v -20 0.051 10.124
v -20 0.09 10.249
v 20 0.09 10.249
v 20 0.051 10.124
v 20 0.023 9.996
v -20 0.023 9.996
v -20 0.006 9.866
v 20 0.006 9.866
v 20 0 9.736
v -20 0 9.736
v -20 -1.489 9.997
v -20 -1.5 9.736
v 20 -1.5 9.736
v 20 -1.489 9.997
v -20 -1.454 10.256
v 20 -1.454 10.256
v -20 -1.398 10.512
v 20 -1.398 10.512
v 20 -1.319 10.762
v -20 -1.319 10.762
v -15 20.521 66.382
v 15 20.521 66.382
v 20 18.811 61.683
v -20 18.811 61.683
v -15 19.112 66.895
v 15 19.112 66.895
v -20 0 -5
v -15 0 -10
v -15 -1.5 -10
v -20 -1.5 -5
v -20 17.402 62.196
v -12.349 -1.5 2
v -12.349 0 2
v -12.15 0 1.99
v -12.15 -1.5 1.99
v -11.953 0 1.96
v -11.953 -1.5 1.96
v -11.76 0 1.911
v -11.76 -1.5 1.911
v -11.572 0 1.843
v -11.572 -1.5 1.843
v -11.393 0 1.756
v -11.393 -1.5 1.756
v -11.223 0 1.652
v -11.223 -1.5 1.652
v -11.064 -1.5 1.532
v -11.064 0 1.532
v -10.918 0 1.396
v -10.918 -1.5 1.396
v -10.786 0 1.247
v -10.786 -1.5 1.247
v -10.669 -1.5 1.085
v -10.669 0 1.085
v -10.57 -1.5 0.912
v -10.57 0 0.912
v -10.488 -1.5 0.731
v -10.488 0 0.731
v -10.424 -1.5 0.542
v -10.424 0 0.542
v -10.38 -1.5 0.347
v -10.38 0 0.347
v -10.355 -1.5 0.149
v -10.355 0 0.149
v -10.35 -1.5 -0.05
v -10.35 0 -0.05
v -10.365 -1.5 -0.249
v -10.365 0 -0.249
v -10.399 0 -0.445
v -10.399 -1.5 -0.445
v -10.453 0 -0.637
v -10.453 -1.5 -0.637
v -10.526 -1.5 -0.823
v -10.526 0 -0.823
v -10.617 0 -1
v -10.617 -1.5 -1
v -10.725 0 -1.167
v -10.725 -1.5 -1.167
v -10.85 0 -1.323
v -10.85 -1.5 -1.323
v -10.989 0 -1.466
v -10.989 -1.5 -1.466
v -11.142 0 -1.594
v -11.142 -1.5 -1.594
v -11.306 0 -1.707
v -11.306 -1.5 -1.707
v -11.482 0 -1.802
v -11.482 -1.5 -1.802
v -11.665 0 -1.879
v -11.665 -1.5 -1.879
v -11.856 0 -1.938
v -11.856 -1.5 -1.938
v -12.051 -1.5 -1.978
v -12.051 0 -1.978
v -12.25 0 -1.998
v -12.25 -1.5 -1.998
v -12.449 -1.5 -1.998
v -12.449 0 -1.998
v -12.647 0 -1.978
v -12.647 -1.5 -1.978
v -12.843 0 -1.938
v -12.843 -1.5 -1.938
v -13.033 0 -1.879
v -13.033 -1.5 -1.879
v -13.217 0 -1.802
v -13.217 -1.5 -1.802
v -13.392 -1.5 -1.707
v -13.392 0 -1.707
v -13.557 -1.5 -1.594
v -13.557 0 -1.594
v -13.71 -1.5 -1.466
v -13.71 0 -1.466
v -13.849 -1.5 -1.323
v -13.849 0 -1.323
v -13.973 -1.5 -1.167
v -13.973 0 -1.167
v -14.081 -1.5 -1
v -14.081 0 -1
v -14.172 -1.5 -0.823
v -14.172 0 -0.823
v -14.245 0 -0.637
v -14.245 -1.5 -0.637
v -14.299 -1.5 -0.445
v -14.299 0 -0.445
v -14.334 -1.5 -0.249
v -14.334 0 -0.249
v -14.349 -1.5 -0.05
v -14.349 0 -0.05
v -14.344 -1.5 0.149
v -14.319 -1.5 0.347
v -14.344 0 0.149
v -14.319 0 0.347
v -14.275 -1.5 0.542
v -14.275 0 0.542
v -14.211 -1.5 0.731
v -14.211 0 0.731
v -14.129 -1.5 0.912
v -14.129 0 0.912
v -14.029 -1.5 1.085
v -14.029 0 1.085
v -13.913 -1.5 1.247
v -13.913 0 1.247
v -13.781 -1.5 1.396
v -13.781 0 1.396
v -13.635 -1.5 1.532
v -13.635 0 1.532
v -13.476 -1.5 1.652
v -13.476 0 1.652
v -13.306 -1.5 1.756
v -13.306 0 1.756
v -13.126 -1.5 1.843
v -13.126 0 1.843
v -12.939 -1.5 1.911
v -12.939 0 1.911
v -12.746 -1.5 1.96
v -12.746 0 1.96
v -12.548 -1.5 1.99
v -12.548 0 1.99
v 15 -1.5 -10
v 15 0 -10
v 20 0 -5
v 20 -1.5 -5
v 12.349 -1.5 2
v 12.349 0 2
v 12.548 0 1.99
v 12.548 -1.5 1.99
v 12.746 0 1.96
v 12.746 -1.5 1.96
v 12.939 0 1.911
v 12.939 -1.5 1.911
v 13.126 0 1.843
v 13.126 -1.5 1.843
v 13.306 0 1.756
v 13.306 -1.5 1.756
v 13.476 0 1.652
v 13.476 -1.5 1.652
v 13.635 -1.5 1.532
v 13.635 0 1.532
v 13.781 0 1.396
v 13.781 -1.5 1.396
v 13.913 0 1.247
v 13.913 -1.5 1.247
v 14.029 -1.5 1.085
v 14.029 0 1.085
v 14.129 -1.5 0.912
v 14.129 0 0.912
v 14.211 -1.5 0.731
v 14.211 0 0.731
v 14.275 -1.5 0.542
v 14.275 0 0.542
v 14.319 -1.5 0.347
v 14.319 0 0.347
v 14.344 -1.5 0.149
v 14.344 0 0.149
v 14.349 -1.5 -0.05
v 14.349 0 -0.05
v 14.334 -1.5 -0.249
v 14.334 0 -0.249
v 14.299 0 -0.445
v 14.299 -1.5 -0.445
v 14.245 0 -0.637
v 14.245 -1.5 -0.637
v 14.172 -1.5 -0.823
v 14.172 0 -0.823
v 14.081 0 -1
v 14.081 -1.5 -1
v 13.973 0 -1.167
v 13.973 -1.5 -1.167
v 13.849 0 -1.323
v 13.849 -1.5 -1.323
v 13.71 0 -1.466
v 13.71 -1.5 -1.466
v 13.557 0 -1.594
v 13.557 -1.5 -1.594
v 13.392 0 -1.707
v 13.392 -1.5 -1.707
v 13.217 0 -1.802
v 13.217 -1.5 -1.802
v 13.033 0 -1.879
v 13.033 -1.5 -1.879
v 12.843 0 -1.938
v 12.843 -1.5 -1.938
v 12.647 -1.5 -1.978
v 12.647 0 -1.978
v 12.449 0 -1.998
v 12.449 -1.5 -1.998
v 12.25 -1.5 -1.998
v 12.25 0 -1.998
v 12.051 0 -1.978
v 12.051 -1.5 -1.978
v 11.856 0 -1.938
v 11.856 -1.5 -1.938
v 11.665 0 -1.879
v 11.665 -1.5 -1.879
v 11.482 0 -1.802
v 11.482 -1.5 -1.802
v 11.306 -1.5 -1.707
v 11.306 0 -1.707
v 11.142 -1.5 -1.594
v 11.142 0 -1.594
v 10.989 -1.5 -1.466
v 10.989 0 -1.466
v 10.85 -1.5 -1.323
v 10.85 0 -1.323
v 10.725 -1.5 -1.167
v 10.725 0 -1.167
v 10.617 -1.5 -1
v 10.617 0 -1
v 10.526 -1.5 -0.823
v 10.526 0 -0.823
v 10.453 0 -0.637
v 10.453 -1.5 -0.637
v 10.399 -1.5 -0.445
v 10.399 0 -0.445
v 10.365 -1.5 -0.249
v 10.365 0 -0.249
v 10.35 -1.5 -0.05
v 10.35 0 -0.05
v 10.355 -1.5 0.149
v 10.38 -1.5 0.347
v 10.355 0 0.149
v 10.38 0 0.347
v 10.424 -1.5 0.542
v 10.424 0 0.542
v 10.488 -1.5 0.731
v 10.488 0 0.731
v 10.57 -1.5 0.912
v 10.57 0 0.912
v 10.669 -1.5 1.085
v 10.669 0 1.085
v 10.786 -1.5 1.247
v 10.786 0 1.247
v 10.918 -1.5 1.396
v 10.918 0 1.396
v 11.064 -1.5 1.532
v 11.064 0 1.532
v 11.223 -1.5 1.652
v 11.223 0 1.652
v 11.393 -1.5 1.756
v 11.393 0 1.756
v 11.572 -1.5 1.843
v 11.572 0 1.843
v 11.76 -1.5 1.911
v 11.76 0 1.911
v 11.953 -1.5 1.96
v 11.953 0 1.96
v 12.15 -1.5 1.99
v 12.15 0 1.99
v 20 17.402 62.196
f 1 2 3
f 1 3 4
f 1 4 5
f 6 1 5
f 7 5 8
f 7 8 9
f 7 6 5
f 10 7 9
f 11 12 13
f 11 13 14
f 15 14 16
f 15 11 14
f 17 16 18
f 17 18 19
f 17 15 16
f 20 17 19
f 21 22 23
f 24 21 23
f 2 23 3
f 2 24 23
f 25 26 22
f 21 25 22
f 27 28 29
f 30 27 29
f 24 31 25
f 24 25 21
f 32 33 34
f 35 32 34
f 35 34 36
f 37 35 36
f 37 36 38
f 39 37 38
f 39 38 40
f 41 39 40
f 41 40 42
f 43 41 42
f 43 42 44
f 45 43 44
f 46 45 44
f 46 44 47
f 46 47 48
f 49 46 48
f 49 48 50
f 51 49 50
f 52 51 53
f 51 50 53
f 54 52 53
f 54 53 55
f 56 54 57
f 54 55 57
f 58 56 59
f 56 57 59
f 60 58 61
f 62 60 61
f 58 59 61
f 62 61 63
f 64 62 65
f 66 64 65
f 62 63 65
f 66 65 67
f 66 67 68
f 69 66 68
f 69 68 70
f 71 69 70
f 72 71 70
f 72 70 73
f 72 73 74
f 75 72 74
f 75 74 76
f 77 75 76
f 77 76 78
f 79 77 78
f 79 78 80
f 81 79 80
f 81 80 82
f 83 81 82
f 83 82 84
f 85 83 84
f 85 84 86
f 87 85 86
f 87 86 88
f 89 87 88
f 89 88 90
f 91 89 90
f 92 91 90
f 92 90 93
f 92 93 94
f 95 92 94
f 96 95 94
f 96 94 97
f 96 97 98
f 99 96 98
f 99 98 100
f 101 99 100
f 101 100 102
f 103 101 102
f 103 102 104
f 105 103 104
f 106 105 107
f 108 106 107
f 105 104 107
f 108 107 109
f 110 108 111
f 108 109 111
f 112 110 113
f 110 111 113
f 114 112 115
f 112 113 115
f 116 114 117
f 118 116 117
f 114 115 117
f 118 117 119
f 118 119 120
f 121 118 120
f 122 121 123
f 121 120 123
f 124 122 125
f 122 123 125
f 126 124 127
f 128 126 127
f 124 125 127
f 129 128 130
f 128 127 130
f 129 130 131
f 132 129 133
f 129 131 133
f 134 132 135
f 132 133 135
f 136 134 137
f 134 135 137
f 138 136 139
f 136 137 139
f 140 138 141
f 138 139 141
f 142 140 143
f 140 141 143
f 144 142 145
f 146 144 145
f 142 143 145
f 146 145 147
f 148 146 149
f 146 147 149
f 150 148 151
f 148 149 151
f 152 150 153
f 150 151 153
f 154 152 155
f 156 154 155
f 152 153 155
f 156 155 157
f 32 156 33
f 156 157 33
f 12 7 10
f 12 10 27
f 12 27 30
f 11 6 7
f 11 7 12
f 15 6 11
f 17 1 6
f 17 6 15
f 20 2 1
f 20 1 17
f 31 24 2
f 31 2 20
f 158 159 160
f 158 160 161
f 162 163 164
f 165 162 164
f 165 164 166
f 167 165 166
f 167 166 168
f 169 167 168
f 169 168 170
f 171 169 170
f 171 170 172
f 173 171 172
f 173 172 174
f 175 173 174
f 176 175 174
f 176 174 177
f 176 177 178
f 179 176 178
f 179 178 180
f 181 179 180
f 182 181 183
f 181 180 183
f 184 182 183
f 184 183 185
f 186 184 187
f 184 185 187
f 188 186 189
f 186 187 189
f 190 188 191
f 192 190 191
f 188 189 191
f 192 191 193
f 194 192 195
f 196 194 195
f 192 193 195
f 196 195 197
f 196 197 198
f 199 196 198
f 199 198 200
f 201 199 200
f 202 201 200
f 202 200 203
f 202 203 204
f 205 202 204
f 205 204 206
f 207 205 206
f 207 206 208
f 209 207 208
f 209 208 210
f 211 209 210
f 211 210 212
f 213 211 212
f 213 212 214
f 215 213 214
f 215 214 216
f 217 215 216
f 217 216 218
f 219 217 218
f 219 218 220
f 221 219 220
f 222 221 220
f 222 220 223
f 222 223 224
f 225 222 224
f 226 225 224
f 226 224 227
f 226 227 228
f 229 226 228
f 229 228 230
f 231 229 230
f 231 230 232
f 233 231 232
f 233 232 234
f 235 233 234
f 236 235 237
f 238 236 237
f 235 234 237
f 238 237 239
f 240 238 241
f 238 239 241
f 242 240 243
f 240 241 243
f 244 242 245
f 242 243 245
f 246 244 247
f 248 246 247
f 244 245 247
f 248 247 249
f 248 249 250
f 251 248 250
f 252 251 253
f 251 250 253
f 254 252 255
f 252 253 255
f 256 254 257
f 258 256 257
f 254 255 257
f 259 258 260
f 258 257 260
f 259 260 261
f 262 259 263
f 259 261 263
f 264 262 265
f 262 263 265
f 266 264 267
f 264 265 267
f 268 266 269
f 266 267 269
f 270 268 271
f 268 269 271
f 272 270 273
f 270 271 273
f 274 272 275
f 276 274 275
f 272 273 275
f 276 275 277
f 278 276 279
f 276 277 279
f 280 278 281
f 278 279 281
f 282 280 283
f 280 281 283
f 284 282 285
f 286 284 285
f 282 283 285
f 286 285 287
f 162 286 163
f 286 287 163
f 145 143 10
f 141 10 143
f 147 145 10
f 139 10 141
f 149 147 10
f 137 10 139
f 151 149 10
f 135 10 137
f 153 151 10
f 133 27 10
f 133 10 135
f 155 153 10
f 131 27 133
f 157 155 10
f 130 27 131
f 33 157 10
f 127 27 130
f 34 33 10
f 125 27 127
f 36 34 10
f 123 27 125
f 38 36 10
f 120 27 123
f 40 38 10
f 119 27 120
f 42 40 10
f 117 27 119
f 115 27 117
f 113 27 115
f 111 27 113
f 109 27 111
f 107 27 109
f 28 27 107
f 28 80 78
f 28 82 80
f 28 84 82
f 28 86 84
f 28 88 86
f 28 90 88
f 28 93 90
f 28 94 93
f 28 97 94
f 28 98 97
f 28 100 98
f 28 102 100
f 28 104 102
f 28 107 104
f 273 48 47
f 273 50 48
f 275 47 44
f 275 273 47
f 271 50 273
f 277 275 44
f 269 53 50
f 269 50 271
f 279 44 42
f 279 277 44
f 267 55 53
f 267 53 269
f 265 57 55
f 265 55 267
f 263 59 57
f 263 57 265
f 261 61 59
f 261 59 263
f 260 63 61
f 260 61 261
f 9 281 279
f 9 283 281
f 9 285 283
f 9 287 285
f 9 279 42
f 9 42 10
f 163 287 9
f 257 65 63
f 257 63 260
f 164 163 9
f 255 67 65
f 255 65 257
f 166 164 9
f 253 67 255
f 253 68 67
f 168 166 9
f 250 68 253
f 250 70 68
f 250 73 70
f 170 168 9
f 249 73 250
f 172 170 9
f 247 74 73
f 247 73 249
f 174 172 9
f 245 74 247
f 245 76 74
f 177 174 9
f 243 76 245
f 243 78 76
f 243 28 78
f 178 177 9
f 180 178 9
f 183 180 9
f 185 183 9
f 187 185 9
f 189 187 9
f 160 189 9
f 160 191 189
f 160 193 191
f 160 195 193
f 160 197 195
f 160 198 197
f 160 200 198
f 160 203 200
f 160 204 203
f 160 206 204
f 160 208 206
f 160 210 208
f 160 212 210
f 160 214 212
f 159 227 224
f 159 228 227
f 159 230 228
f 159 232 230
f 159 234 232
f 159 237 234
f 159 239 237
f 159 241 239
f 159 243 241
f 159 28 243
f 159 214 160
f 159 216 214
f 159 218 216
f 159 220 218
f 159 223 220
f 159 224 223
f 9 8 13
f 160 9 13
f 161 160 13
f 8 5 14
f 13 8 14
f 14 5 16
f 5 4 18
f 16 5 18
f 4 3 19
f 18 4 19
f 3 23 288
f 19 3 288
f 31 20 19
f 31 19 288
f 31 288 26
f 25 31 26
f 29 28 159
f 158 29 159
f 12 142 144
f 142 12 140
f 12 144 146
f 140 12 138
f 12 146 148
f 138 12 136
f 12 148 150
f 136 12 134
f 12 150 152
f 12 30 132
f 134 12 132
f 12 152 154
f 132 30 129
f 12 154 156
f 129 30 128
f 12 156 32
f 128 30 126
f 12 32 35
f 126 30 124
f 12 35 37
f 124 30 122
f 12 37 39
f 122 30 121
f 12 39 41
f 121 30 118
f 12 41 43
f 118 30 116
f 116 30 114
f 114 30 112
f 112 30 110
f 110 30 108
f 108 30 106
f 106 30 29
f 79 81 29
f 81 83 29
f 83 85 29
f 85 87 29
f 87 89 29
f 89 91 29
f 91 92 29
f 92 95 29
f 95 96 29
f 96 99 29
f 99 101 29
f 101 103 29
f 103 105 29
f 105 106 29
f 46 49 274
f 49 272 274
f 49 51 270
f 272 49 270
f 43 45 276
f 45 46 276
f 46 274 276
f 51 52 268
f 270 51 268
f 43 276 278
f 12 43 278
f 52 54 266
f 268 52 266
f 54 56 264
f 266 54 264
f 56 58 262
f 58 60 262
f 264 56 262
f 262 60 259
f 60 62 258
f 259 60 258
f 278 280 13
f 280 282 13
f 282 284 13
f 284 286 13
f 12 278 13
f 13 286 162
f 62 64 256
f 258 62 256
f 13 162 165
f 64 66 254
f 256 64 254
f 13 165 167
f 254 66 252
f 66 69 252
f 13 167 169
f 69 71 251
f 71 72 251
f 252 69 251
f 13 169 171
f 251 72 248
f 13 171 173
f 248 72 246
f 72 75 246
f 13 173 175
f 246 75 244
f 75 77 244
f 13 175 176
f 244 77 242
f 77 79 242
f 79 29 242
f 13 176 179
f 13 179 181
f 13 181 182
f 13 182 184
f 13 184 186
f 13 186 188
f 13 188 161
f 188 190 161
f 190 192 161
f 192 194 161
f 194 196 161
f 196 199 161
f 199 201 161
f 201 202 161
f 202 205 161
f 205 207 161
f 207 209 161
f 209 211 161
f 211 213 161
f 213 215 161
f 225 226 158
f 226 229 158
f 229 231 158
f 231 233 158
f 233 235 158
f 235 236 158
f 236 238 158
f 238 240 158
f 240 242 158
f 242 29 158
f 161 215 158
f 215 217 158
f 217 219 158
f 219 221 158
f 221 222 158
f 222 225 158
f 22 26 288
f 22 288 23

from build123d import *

# Parameters (mm, degrees)
SKETCH1_W                    = 40
SKETCH1_H                    = 20
BASE_FLANGE1_DEPTH           = 1.5
SKETCH4_R                    = 2
CUT_EXTRUDE1_DEPTH           = 10
EDGE_FLANGE1_STRIP_CUT_DEPTH = 40
EDGE_FLANGE1_DEPTH           = 40
CHAMFER1_SIZE                = 5


# Sheet-metal steps are written as plain solids
with BuildPart() as part:
    # Sketch1 → Base-Flange1 (new body)
    with BuildSketch(Plane(origin=(0, 0, 0), x_dir=(1, 0, 0), z_dir=(0, 1, 0))):
        Rectangle(SKETCH1_W, SKETCH1_H)
    extrude(amount=-BASE_FLANGE1_DEPTH)

    # Sketch4 → Cut-Extrude1 (cut)
    with BuildSketch(Plane(origin=(0, 0, 0), x_dir=(1, 0, 0), z_dir=(0, 1, 0))):
        with Locations(Location((-12.349279575, 0, 0), (0, 0, 270))):
            Circle(SKETCH4_R)
        with Locations(Location((12.349279575, 0, 0), (0, 0, 270))):
            Circle(SKETCH4_R)
    extrude(amount=-CUT_EXTRUDE1_DEPTH, mode=Mode.SUBTRACT)

    # Edge-Flange1 strip (across the edge) → Edge-Flange1 strip cut (cut)
    with BuildSketch(Plane(origin=(-20, 0, 10), x_dir=(0, 0.9396926207859105, -0.3420201433256631), z_dir=(1, 0, 0))):
        Polygon((-4.397259152, 7.695663628), (-1.319077862, -0.761569959), (0.090461069, -0.248539744), (-2.987720221, 8.208693843), align=None)
    extrude(amount=EDGE_FLANGE1_STRIP_CUT_DEPTH, mode=Mode.SUBTRACT)

    # Edge-Flange1 section (across the edge) → Edge-Flange1 (add)
    with BuildSketch(Plane(origin=(-20, 0, 10), x_dir=(0, 0.9396926207859105, -0.3420201433256631), z_dir=(1, 0, 0))):
        with BuildLine():
            Line((-1.5, 0.264490471), (-1.5, 60))
            Line((-1.5, 60), (0, 60))
            Line((0, 60), (0, 0.264490471))
            ThreePointArc((0, 0.264490471), (0.02278837, 0.004018205), (0.090461069, -0.248539744))
            Line((0.090461069, -0.248539744), (-1.319077862, -0.761569959))
            ThreePointArc((-1.319077862, -0.761569959), (-1.454423259, -0.256454062), (-1.5, 0.264490471))
        make_face()
    extrude(amount=EDGE_FLANGE1_DEPTH)

    # Chamfer1
    chamfer1_edges = [part.edges().sort_by_distance(p)[0] for p in [
        (-20, 19.816439134, 66.638072355),
        (20, 19.816439134, 66.638072355),
        (-20, -0.75, -10),
        (20, -0.75, -10),
    ]]
    chamfer(chamfer1_edges, length=CHAMFER1_SIZE)


solid = part.part
